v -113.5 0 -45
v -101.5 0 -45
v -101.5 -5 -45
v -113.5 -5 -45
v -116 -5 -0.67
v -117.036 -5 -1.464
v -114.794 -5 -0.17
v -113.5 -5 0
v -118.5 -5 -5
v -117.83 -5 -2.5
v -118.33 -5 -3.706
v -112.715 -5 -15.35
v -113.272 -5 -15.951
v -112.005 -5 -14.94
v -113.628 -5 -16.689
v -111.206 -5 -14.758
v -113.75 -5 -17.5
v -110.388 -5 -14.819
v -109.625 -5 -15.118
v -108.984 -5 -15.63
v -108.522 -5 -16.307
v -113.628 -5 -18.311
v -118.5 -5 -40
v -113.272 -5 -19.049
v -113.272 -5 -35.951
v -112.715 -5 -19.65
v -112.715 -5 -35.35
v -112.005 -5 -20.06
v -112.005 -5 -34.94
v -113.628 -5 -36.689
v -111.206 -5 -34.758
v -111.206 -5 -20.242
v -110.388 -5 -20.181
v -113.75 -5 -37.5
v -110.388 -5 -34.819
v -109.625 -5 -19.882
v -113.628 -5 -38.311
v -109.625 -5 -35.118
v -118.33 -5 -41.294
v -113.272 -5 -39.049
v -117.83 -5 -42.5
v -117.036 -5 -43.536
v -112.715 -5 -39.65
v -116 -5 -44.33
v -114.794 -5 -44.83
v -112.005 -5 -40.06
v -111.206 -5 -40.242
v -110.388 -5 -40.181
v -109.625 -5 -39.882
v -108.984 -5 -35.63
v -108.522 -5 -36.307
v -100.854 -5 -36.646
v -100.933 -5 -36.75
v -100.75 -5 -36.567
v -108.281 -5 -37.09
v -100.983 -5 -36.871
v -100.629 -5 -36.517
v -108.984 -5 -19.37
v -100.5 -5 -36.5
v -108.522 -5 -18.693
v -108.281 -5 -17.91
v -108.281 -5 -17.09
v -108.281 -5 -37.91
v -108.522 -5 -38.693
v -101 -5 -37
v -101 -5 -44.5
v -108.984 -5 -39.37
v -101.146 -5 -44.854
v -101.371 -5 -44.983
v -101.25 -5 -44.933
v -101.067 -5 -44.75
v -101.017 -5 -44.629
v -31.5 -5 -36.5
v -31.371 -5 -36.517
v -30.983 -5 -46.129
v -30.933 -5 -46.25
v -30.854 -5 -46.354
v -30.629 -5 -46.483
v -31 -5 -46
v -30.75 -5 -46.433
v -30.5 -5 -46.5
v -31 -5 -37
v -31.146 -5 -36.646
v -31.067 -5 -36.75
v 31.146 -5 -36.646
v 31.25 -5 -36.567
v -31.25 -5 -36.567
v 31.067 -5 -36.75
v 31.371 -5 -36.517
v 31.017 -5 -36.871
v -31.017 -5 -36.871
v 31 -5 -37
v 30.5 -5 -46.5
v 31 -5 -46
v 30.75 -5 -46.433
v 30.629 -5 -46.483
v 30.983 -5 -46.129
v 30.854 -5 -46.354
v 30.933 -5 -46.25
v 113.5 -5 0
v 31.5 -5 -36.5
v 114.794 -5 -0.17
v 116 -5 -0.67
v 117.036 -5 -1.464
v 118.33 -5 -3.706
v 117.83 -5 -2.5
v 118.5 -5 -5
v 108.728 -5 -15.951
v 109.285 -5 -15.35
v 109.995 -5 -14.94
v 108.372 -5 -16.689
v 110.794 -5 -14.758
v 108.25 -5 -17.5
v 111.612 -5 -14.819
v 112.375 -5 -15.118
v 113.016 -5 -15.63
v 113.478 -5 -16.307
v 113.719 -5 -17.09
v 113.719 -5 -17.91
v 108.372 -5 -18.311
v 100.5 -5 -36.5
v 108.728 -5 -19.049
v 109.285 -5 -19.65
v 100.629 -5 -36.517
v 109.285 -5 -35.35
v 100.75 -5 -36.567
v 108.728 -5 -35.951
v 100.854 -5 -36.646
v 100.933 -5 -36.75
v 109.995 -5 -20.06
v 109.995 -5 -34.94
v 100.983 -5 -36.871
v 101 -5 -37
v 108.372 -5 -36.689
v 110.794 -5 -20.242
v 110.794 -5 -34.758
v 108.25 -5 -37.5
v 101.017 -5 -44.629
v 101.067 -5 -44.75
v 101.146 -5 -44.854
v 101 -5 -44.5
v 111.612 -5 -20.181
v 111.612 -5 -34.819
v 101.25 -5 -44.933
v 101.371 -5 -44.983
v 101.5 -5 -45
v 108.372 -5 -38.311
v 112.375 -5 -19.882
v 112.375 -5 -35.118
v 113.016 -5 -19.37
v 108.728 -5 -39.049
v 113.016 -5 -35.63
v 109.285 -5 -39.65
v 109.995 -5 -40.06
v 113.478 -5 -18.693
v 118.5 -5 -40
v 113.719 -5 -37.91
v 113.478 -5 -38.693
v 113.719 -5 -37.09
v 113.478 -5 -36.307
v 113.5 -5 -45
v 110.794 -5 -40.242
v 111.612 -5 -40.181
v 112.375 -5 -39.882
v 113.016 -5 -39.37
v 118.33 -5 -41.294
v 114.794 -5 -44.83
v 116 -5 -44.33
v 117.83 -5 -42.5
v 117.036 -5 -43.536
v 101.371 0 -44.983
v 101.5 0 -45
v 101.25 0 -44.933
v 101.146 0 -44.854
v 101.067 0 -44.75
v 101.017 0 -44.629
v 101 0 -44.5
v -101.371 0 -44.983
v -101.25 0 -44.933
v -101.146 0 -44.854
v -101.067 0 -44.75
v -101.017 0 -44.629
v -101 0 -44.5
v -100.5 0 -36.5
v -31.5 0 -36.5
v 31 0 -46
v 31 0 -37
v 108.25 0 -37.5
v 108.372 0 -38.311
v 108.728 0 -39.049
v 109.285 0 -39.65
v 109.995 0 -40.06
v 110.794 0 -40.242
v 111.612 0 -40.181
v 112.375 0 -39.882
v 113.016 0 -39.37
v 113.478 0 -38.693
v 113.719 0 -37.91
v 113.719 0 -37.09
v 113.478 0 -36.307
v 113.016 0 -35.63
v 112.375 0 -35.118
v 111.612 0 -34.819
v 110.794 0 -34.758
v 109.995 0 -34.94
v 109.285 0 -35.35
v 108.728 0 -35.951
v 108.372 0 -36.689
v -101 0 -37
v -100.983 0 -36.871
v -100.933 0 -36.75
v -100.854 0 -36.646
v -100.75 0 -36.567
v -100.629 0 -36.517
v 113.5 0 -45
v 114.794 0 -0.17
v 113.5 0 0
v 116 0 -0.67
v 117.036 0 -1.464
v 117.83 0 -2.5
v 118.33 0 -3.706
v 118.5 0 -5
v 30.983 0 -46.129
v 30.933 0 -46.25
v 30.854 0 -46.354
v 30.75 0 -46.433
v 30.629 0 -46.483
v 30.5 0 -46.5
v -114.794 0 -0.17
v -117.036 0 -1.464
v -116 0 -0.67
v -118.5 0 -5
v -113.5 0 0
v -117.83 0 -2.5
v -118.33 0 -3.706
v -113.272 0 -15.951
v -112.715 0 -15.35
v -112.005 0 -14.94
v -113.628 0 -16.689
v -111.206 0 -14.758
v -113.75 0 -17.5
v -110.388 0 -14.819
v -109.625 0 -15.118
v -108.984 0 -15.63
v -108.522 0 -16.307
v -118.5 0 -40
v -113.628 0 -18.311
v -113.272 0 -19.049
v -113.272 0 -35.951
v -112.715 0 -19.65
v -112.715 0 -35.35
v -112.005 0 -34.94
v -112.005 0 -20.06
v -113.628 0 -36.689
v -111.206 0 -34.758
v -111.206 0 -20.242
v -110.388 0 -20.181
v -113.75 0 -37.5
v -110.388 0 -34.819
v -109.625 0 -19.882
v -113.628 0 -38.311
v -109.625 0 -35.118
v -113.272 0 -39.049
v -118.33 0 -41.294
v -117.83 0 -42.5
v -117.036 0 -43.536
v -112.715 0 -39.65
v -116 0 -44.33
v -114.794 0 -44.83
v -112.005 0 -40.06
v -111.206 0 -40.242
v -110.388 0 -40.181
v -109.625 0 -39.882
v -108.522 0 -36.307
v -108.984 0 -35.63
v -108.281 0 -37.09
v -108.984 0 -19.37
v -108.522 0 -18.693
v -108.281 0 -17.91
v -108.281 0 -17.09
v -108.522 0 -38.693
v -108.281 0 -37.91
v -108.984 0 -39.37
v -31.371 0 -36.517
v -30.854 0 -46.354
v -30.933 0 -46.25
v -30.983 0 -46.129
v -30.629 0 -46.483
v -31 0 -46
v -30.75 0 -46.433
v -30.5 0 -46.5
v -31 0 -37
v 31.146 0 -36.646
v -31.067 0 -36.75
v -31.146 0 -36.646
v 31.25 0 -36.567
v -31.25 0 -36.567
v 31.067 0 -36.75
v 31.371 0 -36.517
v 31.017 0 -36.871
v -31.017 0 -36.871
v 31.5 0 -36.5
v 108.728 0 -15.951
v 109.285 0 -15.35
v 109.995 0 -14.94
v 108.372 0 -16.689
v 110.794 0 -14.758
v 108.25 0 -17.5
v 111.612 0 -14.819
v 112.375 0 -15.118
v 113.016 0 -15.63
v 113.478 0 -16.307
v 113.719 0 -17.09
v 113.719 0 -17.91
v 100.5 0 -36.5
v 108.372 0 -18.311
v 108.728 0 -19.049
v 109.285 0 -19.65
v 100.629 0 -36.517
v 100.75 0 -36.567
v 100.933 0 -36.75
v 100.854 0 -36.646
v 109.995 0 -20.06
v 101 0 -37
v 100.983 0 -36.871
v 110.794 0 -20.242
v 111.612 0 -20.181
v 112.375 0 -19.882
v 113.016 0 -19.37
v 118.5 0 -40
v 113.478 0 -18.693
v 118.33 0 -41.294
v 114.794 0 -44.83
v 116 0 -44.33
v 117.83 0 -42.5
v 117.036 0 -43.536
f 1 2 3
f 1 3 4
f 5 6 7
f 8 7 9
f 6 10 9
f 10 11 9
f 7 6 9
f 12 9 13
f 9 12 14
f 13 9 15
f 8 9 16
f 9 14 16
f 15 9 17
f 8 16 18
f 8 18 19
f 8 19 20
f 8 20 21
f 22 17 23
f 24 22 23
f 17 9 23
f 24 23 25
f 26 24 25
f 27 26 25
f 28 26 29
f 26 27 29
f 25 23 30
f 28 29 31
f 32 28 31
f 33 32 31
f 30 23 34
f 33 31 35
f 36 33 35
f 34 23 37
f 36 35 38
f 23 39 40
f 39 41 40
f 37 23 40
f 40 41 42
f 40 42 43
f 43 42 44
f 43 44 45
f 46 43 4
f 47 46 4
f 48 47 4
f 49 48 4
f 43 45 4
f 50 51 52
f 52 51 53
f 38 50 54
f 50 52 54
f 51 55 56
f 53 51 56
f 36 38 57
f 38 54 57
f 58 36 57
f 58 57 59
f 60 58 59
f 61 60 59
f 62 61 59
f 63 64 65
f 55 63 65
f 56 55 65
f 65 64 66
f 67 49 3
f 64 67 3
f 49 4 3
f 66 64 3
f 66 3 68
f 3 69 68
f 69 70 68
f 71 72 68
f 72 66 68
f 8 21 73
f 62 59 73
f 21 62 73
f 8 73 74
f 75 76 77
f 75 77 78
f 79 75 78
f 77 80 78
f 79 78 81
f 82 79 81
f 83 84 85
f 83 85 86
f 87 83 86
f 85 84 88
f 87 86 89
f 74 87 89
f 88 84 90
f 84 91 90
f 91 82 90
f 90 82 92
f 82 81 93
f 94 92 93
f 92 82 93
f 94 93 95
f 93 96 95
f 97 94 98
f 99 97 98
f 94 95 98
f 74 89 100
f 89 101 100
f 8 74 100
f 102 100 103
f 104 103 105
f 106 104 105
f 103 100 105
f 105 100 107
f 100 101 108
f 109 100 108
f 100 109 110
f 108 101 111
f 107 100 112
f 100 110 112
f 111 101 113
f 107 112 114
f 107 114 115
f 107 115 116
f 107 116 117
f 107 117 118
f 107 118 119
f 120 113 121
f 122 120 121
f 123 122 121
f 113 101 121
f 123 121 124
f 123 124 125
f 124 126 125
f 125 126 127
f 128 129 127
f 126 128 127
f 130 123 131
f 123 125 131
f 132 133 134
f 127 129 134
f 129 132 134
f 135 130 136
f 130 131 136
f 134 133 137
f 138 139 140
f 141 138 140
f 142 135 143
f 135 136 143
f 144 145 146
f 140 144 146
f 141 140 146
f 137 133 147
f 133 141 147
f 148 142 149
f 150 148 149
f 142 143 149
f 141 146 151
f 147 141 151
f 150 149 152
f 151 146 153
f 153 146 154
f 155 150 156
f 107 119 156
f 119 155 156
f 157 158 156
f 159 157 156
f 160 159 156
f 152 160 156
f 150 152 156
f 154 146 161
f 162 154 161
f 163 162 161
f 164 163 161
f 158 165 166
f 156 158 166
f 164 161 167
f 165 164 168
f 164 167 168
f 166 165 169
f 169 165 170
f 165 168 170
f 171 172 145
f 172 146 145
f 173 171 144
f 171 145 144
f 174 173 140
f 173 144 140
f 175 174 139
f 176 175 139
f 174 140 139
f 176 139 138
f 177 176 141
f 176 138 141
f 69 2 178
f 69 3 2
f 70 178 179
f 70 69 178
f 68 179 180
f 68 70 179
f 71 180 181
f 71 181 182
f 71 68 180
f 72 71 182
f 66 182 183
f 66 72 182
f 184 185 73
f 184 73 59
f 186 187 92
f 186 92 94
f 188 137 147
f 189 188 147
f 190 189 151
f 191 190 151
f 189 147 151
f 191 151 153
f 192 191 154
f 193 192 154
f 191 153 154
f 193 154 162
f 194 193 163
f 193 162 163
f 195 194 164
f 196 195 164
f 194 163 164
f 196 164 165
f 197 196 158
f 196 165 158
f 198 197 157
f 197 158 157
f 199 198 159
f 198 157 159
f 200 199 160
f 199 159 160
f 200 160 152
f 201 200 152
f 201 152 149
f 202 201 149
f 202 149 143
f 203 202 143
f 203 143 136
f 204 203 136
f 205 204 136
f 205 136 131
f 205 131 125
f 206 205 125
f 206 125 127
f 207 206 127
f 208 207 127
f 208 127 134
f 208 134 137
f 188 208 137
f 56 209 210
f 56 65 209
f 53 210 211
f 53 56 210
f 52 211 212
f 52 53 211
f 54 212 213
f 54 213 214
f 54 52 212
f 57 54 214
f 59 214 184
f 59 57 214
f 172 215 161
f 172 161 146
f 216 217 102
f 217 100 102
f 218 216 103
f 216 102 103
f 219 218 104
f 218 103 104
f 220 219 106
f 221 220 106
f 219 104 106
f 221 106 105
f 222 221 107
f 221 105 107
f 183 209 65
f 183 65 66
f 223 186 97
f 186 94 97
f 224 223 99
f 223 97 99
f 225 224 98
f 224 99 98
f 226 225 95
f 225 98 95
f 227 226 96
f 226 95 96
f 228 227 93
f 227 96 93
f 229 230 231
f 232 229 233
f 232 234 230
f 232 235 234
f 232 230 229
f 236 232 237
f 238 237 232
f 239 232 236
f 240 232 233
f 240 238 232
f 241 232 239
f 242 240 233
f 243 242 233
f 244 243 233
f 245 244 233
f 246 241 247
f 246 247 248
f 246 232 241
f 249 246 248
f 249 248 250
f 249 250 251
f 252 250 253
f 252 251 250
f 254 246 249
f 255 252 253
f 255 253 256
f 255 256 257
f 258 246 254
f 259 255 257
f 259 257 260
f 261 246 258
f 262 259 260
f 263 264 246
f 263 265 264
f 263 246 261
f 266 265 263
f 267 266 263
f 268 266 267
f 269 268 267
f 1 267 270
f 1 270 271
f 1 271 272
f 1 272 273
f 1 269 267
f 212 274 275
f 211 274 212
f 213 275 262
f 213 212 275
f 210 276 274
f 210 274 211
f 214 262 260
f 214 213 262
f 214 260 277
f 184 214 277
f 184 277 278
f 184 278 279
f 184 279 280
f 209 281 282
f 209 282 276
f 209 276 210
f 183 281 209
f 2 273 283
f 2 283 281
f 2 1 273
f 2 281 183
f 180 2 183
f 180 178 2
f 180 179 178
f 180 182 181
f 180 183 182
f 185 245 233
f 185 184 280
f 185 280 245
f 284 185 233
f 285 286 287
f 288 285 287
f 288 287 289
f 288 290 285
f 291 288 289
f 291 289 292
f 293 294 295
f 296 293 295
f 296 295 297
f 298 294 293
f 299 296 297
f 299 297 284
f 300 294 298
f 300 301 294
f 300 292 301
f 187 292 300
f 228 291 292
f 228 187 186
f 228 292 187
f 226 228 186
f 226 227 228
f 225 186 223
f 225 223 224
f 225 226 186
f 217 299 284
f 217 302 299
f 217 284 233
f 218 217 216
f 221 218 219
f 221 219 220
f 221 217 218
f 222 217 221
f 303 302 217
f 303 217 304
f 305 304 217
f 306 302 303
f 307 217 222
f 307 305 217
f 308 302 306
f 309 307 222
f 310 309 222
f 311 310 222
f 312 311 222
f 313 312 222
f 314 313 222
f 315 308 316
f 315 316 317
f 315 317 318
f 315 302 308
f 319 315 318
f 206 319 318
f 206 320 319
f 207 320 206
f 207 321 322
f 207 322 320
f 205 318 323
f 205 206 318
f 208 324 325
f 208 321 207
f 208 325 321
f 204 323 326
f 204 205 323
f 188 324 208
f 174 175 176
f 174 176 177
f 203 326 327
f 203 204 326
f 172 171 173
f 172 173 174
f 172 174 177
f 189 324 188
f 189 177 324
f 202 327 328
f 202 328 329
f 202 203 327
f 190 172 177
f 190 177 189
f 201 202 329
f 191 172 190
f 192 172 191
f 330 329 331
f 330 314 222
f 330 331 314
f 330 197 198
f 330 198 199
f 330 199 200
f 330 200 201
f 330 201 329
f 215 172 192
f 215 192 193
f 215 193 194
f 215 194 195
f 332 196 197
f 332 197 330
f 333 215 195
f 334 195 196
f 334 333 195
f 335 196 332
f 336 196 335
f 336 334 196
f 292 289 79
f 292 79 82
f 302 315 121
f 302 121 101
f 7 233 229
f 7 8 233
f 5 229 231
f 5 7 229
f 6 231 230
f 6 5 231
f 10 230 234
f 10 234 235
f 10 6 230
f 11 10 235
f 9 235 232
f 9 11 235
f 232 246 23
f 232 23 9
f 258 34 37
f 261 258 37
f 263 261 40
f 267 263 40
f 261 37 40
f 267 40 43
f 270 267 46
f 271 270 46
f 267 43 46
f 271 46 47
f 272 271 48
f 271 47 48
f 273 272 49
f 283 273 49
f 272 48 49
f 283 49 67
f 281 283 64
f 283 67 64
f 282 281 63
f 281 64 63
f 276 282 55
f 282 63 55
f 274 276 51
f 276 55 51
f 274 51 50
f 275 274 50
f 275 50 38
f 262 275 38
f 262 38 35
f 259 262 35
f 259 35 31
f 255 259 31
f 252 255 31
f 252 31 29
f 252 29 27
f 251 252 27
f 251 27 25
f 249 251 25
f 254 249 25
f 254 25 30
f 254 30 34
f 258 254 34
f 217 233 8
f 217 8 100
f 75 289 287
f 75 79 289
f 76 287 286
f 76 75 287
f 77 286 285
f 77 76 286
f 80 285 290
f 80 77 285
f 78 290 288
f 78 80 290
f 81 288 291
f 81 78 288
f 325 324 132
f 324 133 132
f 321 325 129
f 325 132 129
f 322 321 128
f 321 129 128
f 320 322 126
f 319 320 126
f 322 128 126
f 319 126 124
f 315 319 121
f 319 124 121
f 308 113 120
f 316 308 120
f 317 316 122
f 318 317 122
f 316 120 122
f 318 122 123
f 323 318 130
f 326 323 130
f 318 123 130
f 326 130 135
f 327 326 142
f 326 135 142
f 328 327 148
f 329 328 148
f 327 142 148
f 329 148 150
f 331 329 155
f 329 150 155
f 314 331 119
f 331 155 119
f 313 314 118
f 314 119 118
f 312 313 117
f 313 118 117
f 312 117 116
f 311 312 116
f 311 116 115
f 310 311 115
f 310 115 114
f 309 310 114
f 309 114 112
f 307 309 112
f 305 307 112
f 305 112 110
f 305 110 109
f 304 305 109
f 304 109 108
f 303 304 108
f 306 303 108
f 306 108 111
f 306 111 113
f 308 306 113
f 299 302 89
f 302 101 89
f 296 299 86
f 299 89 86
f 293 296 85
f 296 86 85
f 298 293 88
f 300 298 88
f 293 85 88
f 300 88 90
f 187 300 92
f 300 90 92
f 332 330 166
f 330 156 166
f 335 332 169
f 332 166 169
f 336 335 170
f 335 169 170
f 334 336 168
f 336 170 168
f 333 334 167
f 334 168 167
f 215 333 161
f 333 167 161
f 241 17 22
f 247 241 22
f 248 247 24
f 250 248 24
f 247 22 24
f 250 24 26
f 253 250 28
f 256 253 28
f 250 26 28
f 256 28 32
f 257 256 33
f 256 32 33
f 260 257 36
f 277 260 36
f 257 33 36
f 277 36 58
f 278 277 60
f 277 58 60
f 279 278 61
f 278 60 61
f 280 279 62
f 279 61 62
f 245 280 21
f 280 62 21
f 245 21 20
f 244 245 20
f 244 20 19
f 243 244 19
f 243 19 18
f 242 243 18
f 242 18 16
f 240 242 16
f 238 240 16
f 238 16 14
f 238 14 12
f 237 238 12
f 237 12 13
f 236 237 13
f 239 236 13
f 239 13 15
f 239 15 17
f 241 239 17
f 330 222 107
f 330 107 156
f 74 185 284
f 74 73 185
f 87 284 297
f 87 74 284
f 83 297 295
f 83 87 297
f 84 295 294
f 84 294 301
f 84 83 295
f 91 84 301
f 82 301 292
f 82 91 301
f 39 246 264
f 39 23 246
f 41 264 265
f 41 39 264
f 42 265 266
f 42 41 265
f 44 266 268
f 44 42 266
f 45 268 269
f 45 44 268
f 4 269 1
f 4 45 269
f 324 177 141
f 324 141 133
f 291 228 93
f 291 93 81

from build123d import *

# Parameters (mm, degrees)
BOSS_EXTRUDE1_DEPTH  = 5
M5_CLEARANCE_HOLE1_D = 5.5
FILLET1_R            = 5
FILLET2_R            = 0.5


with BuildPart() as part:
    # Sketch1 → Boss-Extrude1 (new body)
    with BuildSketch(Plane(origin=(0, 0, 0), x_dir=(1, 0, 0), z_dir=(0, 1, 0))):
        Polygon((-118.5, 0), (118.5, 0), (118.5, 45), (101, 45), (101, 36.5), (31, 36.5), (31, 46.5), (-31, 46.5), (-31, 36.5), (-101, 36.5), (-101, 45), (-118.5, 45), align=None)
    extrude(amount=-BOSS_EXTRUDE1_DEPTH)

    # M5 Clearance Hole1 (through all)
    with Locations(Plane(origin=(0, 0, 0), x_dir=(1, 0, 0), z_dir=(0, 1, 0))):
        with Locations((-111, 37.5), (-111, 17.5), (111, 37.5), (111, 17.5)):
            Hole(M5_CLEARANCE_HOLE1_D / 2)

    # Fillet1
    fillet1_edges = [part.edges().sort_by_distance(p)[0] for p in [
        (-118.5, -2.5, -45),
        (118.5, -2.5, -45),
        (118.5, -2.5, 0),
        (-118.5, -2.5, 0),
    ]]
    fillet(fillet1_edges, radius=FILLET1_R)

    # Fillet2
    fillet2_edges = [part.edges().sort_by_distance(p)[0] for p in [
        (-101, -2.5, -45),
        (-101, -2.5, -36.5),
        (-31, -2.5, -36.5),
        (-31, -2.5, -46.5),
        (31, -2.5, -46.5),
        (31, -2.5, -36.5),
        (101, -2.5, -36.5),
        (101, -2.5, -45),
    ]]
    fillet(fillet2_edges, radius=FILLET2_R)


solid = part.part
